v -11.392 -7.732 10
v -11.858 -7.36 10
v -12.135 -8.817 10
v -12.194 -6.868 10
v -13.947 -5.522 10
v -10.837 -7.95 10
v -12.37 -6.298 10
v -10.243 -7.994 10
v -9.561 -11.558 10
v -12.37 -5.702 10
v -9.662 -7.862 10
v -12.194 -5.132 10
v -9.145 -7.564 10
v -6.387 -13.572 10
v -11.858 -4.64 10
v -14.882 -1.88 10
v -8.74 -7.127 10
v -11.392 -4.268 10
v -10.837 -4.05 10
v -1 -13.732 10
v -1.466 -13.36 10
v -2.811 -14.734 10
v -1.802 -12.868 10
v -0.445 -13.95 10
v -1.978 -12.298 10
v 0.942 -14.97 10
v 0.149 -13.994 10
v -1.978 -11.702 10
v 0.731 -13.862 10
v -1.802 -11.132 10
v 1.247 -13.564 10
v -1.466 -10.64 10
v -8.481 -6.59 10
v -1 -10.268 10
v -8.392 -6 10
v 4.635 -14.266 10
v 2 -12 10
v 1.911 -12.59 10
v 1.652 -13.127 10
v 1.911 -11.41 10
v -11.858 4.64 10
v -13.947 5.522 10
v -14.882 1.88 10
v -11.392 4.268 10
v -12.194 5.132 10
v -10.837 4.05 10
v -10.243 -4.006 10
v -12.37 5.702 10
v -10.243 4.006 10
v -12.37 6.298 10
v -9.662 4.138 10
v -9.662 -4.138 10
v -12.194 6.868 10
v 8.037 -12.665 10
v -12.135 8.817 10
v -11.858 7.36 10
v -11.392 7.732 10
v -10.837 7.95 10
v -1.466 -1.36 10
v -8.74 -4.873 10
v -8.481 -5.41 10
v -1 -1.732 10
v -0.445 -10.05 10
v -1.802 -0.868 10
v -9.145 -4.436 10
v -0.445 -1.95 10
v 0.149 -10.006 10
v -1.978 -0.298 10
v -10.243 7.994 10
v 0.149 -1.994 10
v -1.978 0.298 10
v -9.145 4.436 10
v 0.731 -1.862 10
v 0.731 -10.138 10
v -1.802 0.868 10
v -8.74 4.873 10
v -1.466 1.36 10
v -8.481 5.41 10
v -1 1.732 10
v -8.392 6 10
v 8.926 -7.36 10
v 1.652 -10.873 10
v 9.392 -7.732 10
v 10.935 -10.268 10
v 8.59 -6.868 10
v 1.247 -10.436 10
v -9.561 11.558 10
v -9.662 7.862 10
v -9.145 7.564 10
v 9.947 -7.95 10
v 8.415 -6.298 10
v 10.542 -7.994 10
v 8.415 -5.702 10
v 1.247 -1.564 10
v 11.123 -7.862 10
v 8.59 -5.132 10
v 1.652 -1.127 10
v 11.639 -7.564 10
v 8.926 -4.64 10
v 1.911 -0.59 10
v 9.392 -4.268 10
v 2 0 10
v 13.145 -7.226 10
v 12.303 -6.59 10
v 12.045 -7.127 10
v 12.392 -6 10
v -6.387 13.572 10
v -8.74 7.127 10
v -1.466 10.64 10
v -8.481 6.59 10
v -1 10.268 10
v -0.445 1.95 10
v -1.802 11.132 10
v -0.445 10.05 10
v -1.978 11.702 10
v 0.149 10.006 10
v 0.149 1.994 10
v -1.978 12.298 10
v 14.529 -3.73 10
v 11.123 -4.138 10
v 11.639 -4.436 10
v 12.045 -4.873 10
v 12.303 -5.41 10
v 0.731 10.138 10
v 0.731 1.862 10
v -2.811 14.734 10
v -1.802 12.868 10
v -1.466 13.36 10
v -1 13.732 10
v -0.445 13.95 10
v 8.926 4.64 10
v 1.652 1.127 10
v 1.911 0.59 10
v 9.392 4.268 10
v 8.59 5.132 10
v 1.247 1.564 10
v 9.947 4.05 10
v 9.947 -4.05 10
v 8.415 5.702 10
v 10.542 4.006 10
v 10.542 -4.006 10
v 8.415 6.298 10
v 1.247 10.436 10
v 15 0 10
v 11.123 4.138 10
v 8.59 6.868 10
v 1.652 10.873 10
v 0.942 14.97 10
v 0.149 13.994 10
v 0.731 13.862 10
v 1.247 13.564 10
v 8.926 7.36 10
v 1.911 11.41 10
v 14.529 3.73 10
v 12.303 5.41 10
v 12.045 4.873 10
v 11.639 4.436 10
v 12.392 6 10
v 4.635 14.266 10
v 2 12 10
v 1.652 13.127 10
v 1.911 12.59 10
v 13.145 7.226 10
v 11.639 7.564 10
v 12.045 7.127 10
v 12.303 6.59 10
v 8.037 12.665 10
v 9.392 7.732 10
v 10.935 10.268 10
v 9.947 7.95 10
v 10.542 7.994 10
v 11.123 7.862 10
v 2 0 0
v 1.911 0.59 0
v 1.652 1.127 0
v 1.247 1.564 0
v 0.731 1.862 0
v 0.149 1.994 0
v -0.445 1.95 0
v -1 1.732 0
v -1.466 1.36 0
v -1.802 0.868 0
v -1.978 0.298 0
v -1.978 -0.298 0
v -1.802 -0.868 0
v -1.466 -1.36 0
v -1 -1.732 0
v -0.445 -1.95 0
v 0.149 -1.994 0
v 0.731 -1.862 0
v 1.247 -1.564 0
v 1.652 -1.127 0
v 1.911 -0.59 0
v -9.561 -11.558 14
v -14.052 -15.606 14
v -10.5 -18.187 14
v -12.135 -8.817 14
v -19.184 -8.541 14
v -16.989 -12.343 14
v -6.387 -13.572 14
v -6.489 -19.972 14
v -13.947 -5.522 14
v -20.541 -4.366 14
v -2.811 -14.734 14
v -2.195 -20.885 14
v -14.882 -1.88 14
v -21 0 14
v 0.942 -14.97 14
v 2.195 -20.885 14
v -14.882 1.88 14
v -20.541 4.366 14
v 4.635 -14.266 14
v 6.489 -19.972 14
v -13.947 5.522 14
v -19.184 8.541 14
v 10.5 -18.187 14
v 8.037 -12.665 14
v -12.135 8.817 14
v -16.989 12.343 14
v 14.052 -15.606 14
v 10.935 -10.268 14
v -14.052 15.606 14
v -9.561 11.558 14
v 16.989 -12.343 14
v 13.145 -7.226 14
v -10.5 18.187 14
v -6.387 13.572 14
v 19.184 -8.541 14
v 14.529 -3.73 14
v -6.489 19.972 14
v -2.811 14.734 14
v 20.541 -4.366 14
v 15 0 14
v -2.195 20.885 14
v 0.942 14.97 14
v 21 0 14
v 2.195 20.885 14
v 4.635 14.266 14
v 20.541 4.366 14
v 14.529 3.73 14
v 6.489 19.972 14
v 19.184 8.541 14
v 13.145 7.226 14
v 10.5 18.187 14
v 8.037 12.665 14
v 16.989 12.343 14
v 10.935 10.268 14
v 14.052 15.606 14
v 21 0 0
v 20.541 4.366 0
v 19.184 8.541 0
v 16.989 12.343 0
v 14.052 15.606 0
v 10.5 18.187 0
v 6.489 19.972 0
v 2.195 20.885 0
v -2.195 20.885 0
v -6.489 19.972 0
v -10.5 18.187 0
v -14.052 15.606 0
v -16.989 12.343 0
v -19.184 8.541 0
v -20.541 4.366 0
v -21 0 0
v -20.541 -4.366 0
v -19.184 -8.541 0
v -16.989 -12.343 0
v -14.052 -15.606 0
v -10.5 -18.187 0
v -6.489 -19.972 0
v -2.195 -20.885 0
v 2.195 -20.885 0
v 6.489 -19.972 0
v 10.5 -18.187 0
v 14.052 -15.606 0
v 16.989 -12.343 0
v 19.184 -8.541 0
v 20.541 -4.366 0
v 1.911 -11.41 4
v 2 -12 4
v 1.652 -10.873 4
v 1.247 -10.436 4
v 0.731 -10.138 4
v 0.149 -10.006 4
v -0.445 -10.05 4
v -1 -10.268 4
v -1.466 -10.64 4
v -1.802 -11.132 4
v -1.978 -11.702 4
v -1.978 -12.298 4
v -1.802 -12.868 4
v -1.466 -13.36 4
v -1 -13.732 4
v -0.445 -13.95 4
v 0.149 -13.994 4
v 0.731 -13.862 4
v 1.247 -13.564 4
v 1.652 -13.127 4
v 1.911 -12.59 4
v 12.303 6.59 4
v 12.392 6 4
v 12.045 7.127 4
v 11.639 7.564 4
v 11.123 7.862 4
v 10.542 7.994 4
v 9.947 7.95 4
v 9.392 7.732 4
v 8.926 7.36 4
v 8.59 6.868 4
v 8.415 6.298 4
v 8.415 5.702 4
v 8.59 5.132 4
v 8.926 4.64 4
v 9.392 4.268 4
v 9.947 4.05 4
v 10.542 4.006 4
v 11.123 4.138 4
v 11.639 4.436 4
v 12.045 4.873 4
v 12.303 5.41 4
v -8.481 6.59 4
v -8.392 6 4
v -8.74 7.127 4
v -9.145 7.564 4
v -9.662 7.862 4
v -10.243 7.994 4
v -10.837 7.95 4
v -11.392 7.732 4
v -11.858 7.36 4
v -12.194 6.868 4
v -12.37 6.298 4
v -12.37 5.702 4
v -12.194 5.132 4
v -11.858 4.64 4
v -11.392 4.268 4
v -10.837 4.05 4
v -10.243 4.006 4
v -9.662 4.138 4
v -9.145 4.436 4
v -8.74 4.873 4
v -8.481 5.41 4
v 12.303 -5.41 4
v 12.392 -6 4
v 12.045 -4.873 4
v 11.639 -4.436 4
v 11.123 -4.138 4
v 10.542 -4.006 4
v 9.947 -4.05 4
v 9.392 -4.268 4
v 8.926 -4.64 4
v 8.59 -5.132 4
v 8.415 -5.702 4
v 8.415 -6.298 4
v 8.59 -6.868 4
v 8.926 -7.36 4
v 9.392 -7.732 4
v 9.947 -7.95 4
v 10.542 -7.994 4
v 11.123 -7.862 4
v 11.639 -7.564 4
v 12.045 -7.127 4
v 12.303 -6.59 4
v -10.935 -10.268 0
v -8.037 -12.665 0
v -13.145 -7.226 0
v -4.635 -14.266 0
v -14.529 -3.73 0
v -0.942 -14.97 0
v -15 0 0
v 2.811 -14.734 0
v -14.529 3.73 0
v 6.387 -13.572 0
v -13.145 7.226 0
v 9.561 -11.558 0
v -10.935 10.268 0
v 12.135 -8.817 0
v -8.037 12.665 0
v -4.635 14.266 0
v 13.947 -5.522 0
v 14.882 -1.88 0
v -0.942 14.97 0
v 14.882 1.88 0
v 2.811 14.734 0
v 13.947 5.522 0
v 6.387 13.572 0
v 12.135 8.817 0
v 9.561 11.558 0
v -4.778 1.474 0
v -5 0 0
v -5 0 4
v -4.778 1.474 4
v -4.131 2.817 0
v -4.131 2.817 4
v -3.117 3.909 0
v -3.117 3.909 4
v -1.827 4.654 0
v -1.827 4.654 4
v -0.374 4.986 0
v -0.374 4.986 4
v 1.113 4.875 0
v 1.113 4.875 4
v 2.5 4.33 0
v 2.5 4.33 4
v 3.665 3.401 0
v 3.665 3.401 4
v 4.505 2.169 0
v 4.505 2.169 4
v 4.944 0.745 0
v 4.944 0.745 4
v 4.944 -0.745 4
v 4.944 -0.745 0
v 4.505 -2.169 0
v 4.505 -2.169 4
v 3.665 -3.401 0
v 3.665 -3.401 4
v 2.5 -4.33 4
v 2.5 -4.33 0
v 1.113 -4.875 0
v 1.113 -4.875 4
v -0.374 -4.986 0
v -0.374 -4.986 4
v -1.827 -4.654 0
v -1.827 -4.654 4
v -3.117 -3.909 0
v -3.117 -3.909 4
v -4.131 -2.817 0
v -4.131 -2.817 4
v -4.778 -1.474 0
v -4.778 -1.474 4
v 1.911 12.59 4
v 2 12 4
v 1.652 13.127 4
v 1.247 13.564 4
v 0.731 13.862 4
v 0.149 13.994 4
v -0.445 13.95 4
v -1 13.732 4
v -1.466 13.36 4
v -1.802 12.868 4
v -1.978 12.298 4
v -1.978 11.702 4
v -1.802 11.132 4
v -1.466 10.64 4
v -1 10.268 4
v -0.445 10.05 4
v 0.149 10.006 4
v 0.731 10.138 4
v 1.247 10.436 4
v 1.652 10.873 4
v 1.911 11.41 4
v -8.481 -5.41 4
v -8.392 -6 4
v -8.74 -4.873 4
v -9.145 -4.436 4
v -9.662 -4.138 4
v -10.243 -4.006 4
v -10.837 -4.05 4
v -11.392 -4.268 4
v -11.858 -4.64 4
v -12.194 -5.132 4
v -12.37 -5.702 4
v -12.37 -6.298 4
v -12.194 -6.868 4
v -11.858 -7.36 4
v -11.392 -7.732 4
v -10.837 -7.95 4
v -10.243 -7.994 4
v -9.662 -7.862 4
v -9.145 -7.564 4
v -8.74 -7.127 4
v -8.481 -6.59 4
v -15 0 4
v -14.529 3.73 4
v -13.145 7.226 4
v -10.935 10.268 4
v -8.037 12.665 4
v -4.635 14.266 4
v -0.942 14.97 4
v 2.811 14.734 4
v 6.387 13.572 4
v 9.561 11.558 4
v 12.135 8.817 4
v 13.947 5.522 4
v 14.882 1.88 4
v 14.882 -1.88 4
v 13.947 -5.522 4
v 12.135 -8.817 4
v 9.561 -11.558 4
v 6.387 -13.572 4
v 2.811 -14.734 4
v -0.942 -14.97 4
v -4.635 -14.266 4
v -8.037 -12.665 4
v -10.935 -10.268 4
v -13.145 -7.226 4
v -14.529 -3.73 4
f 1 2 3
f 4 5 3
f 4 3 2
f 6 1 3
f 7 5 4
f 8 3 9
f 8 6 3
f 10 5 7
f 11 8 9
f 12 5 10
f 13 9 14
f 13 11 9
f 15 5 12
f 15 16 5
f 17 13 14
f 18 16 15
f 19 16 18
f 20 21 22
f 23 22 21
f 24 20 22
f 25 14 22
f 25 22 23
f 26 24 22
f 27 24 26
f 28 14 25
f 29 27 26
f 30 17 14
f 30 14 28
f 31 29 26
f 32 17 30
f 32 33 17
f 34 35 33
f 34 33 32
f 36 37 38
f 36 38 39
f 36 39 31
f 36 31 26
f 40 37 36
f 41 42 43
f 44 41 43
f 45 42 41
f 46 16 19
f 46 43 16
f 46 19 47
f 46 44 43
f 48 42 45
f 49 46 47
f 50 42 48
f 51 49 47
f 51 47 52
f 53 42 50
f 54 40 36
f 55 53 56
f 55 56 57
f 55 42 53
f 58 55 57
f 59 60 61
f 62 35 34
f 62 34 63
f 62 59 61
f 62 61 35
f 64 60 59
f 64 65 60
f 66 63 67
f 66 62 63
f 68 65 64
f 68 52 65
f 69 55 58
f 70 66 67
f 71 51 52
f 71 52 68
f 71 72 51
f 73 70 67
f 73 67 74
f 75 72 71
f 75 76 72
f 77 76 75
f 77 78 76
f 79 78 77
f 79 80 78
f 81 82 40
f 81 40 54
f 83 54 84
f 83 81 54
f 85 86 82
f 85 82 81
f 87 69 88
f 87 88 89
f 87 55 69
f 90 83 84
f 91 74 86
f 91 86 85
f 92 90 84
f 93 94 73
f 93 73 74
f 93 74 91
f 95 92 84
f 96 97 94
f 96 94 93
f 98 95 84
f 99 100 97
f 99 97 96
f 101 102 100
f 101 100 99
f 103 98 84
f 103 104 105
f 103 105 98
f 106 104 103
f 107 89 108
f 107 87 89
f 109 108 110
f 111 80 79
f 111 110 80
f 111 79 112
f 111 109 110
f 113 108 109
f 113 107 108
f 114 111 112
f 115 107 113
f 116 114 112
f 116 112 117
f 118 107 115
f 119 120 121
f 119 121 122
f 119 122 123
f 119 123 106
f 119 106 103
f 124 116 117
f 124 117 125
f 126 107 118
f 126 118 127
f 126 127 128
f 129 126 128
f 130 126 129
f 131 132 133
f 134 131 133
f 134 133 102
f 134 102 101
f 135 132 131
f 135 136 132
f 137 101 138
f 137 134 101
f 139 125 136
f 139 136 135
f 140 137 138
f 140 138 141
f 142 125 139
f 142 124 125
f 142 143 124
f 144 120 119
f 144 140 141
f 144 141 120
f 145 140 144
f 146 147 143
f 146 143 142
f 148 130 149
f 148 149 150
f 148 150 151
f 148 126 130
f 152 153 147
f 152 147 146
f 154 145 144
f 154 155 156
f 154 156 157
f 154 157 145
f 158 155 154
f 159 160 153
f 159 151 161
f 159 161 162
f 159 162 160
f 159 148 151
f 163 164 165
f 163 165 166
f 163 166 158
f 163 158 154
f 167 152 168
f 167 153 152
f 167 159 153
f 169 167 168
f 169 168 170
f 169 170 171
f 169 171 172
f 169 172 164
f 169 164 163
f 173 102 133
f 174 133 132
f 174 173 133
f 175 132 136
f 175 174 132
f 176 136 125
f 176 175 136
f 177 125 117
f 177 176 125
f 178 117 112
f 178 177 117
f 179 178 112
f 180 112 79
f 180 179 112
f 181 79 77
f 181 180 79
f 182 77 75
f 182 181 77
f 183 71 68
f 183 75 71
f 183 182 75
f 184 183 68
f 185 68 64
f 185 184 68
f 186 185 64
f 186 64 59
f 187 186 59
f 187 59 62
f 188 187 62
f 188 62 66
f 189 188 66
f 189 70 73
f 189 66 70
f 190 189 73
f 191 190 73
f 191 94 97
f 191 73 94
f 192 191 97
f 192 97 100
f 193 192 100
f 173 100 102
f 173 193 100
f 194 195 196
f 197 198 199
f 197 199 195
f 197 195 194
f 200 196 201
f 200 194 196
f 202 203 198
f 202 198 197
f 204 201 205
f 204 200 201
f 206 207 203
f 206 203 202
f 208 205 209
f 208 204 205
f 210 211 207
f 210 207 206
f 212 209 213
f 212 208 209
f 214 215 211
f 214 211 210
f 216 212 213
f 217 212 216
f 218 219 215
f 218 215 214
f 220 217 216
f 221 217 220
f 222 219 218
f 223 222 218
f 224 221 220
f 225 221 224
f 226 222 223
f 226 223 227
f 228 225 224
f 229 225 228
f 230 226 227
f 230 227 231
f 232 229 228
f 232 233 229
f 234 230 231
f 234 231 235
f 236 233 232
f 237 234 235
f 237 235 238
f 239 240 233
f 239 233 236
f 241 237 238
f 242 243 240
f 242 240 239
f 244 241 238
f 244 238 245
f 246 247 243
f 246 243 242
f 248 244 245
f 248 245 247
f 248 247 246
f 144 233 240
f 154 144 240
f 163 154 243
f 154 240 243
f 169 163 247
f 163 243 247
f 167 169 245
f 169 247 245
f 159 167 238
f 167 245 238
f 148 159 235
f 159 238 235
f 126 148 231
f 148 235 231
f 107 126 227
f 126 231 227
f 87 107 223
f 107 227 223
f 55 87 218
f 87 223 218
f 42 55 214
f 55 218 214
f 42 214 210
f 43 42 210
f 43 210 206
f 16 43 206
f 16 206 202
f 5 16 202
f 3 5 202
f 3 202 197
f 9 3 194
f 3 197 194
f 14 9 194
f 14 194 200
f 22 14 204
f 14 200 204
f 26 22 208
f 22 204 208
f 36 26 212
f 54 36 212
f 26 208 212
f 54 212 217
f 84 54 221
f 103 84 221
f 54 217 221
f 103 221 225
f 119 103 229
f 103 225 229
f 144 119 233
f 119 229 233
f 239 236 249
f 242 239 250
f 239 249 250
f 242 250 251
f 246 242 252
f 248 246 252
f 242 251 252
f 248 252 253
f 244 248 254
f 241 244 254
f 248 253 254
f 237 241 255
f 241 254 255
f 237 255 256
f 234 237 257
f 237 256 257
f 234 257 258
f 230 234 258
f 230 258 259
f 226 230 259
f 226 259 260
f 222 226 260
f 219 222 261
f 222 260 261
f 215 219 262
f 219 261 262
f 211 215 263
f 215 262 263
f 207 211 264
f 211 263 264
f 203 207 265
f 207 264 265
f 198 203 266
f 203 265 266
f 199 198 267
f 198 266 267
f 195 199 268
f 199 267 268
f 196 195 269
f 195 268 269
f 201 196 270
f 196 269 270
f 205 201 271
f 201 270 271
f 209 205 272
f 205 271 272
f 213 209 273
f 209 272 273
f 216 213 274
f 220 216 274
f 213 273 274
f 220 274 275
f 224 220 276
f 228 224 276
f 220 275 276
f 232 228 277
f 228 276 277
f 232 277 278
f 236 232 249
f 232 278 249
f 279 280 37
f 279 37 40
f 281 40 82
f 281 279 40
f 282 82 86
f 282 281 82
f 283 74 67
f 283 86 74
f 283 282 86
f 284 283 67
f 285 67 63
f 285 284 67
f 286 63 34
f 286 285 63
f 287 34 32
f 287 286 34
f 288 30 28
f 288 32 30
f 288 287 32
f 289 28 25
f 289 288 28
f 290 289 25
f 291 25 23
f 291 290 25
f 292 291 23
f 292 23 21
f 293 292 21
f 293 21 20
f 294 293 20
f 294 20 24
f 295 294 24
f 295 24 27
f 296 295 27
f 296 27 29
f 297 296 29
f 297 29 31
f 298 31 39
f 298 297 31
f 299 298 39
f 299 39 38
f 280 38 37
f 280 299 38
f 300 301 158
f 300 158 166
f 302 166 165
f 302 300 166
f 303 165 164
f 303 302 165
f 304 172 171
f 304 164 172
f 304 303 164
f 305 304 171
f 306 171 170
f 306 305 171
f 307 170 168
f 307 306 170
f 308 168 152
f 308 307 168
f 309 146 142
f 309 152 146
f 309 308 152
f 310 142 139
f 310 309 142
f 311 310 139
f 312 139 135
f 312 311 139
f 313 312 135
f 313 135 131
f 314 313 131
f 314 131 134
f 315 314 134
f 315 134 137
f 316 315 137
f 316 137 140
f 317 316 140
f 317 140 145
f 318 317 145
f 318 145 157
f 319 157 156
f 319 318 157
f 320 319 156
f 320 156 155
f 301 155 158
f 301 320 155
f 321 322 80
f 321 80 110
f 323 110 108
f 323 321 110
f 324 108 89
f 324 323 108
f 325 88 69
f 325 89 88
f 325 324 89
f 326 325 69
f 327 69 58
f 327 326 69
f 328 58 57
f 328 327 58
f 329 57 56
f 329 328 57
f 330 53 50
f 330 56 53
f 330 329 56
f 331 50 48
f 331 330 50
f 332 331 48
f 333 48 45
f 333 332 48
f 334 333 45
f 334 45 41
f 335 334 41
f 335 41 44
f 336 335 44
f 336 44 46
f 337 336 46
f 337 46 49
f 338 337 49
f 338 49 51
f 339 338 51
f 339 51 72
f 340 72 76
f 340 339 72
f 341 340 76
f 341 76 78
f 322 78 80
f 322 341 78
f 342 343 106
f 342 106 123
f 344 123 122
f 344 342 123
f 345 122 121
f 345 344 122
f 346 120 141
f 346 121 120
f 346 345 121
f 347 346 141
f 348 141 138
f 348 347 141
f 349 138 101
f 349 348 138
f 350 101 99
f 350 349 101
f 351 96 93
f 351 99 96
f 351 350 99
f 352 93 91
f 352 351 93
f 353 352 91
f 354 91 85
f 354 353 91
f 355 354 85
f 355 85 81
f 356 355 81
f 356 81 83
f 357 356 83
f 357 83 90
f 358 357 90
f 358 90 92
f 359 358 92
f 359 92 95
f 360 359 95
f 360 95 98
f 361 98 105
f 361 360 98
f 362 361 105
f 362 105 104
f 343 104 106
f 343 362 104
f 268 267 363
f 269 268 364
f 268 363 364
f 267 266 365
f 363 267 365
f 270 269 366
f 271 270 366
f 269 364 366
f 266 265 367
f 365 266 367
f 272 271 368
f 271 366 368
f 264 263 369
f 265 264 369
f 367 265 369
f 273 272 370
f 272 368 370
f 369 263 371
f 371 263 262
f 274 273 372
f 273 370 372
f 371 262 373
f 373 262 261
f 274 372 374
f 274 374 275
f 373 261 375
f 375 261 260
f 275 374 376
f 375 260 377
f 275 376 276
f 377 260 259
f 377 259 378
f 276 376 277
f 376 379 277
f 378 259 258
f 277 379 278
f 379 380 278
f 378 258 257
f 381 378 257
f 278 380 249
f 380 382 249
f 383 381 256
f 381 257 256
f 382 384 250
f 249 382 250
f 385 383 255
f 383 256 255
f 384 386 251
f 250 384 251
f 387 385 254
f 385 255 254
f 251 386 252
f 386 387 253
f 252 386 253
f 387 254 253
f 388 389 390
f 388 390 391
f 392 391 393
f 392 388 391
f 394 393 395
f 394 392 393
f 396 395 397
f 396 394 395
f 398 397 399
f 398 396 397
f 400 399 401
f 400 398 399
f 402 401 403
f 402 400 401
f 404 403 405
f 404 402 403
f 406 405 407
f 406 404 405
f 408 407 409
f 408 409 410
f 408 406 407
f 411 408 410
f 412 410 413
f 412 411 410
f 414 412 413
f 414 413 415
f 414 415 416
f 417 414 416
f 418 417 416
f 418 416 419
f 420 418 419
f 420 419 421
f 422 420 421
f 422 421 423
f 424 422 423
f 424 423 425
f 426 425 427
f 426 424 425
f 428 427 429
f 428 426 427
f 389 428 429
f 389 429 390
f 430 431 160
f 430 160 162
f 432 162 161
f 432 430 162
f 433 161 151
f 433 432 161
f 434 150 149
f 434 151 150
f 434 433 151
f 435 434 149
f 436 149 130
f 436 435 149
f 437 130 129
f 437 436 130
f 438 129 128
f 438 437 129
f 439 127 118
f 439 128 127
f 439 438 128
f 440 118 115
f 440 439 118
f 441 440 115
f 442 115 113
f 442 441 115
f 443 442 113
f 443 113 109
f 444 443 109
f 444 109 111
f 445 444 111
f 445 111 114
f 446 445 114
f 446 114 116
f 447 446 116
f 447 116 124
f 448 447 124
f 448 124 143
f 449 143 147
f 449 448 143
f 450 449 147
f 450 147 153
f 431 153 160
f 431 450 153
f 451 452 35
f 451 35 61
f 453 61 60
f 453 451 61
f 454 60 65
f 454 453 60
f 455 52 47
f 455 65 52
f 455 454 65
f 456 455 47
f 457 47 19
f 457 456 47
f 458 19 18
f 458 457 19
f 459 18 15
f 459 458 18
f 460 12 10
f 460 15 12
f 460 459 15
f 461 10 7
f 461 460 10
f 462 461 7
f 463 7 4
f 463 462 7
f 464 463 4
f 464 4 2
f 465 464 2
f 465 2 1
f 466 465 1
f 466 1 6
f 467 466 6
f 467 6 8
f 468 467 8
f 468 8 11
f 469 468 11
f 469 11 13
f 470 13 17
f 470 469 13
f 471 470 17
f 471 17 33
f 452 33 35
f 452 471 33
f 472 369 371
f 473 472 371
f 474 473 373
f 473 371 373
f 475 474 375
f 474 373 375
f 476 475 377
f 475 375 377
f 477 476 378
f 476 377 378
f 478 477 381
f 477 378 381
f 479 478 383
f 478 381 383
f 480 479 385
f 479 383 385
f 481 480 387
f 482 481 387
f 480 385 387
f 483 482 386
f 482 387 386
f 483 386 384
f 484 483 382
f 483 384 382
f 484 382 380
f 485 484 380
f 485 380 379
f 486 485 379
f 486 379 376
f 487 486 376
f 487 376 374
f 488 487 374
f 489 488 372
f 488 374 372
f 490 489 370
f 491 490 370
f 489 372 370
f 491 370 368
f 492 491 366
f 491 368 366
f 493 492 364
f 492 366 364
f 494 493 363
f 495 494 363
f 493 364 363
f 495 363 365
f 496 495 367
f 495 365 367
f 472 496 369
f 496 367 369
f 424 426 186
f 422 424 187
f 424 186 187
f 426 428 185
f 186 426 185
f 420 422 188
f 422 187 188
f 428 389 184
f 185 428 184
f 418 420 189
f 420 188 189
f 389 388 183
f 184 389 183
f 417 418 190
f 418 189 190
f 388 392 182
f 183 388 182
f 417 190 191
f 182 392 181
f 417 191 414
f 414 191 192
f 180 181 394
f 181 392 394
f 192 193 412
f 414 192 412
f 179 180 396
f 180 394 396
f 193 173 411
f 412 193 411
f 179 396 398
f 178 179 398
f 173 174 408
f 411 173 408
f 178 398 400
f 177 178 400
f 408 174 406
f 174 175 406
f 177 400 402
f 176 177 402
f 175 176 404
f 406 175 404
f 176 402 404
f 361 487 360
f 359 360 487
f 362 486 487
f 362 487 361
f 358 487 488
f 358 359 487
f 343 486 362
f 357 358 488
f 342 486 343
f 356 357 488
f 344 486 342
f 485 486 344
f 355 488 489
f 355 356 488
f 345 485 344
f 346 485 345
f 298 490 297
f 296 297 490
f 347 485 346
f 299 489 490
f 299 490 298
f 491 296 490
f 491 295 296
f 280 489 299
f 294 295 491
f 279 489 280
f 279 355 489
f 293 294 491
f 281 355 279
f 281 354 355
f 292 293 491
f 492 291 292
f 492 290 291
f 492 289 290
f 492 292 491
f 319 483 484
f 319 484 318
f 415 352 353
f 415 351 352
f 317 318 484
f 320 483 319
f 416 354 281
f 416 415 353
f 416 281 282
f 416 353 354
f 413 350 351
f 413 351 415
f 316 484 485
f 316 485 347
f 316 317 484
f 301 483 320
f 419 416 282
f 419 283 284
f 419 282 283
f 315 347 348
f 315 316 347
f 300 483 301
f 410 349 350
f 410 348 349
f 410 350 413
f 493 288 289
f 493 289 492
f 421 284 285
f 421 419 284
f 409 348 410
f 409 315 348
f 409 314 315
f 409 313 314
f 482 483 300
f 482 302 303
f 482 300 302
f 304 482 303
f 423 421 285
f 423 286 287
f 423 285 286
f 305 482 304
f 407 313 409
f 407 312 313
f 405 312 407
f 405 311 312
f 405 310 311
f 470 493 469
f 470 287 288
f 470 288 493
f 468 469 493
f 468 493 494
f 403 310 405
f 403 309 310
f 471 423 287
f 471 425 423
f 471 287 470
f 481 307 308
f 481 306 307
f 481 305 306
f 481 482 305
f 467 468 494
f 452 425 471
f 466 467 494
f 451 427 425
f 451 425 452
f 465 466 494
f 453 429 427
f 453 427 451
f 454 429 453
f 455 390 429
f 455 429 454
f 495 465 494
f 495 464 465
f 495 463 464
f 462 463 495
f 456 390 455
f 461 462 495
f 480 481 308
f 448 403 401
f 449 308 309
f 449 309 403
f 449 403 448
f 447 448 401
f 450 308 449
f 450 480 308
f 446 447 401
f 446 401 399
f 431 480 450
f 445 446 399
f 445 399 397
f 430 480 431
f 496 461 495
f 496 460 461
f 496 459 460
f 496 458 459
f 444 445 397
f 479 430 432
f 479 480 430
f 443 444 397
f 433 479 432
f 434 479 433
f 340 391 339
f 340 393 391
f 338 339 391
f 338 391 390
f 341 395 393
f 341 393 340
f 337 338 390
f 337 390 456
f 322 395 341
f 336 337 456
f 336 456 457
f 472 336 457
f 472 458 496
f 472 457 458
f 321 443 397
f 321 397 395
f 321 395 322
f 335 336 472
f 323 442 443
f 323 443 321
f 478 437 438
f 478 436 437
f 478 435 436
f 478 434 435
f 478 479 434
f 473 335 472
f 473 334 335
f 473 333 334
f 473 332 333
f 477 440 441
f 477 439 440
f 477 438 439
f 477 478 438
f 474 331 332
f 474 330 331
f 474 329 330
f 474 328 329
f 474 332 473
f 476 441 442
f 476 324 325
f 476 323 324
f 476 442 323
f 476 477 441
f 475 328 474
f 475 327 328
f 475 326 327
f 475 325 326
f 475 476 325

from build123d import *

# Parameters (mm, degrees)
SKETCH1_R           = 21
SKETCH1_R_2         = 2
BOSS_EXTRUDE1_DEPTH = 14
SKETCH2_R           = 15
CUT_EXTRUDE1_DEPTH  = 4
SKETCH3_R           = 15
SKETCH3_R_2         = 5
CUT_EXTRUDE2_DEPTH  = 4


with BuildPart() as part:
    # Sketch1 → Boss-Extrude1 (new body)
    with BuildSketch(Plane.XY):
        Circle(SKETCH1_R)
        with Locations((0, 12)):
            Circle(SKETCH1_R_2, mode=Mode.SUBTRACT)
        with Locations((10.392304845, 6)):
            Circle(SKETCH1_R_2, mode=Mode.SUBTRACT)
        with Locations((10.392304845, -6)):
            Circle(SKETCH1_R_2, mode=Mode.SUBTRACT)
        with Locations((0, -12)):
            Circle(SKETCH1_R_2, mode=Mode.SUBTRACT)
        with Locations((-10.392304845, -6)):
            Circle(SKETCH1_R_2, mode=Mode.SUBTRACT)
        with Locations((-10.392304845, 6)):
            Circle(SKETCH1_R_2, mode=Mode.SUBTRACT)
        Circle(SKETCH1_R_2, mode=Mode.SUBTRACT)
    extrude(amount=BOSS_EXTRUDE1_DEPTH)

    # Sketch2 → Cut-Extrude1 (cut)
    with BuildSketch(Plane.XY.offset(14)):
        Circle(SKETCH2_R)
    extrude(amount=-CUT_EXTRUDE1_DEPTH, mode=Mode.SUBTRACT)

    # Sketch3 → Cut-Extrude2 (cut)
    with BuildSketch(Plane(origin=(0, 0, 0), x_dir=(-1, 0, 0), z_dir=(0, 0, -1))):
        Circle(SKETCH3_R)
        Circle(SKETCH3_R_2, mode=Mode.SUBTRACT)
    extrude(amount=-CUT_EXTRUDE2_DEPTH, mode=Mode.SUBTRACT)


solid = part.part
